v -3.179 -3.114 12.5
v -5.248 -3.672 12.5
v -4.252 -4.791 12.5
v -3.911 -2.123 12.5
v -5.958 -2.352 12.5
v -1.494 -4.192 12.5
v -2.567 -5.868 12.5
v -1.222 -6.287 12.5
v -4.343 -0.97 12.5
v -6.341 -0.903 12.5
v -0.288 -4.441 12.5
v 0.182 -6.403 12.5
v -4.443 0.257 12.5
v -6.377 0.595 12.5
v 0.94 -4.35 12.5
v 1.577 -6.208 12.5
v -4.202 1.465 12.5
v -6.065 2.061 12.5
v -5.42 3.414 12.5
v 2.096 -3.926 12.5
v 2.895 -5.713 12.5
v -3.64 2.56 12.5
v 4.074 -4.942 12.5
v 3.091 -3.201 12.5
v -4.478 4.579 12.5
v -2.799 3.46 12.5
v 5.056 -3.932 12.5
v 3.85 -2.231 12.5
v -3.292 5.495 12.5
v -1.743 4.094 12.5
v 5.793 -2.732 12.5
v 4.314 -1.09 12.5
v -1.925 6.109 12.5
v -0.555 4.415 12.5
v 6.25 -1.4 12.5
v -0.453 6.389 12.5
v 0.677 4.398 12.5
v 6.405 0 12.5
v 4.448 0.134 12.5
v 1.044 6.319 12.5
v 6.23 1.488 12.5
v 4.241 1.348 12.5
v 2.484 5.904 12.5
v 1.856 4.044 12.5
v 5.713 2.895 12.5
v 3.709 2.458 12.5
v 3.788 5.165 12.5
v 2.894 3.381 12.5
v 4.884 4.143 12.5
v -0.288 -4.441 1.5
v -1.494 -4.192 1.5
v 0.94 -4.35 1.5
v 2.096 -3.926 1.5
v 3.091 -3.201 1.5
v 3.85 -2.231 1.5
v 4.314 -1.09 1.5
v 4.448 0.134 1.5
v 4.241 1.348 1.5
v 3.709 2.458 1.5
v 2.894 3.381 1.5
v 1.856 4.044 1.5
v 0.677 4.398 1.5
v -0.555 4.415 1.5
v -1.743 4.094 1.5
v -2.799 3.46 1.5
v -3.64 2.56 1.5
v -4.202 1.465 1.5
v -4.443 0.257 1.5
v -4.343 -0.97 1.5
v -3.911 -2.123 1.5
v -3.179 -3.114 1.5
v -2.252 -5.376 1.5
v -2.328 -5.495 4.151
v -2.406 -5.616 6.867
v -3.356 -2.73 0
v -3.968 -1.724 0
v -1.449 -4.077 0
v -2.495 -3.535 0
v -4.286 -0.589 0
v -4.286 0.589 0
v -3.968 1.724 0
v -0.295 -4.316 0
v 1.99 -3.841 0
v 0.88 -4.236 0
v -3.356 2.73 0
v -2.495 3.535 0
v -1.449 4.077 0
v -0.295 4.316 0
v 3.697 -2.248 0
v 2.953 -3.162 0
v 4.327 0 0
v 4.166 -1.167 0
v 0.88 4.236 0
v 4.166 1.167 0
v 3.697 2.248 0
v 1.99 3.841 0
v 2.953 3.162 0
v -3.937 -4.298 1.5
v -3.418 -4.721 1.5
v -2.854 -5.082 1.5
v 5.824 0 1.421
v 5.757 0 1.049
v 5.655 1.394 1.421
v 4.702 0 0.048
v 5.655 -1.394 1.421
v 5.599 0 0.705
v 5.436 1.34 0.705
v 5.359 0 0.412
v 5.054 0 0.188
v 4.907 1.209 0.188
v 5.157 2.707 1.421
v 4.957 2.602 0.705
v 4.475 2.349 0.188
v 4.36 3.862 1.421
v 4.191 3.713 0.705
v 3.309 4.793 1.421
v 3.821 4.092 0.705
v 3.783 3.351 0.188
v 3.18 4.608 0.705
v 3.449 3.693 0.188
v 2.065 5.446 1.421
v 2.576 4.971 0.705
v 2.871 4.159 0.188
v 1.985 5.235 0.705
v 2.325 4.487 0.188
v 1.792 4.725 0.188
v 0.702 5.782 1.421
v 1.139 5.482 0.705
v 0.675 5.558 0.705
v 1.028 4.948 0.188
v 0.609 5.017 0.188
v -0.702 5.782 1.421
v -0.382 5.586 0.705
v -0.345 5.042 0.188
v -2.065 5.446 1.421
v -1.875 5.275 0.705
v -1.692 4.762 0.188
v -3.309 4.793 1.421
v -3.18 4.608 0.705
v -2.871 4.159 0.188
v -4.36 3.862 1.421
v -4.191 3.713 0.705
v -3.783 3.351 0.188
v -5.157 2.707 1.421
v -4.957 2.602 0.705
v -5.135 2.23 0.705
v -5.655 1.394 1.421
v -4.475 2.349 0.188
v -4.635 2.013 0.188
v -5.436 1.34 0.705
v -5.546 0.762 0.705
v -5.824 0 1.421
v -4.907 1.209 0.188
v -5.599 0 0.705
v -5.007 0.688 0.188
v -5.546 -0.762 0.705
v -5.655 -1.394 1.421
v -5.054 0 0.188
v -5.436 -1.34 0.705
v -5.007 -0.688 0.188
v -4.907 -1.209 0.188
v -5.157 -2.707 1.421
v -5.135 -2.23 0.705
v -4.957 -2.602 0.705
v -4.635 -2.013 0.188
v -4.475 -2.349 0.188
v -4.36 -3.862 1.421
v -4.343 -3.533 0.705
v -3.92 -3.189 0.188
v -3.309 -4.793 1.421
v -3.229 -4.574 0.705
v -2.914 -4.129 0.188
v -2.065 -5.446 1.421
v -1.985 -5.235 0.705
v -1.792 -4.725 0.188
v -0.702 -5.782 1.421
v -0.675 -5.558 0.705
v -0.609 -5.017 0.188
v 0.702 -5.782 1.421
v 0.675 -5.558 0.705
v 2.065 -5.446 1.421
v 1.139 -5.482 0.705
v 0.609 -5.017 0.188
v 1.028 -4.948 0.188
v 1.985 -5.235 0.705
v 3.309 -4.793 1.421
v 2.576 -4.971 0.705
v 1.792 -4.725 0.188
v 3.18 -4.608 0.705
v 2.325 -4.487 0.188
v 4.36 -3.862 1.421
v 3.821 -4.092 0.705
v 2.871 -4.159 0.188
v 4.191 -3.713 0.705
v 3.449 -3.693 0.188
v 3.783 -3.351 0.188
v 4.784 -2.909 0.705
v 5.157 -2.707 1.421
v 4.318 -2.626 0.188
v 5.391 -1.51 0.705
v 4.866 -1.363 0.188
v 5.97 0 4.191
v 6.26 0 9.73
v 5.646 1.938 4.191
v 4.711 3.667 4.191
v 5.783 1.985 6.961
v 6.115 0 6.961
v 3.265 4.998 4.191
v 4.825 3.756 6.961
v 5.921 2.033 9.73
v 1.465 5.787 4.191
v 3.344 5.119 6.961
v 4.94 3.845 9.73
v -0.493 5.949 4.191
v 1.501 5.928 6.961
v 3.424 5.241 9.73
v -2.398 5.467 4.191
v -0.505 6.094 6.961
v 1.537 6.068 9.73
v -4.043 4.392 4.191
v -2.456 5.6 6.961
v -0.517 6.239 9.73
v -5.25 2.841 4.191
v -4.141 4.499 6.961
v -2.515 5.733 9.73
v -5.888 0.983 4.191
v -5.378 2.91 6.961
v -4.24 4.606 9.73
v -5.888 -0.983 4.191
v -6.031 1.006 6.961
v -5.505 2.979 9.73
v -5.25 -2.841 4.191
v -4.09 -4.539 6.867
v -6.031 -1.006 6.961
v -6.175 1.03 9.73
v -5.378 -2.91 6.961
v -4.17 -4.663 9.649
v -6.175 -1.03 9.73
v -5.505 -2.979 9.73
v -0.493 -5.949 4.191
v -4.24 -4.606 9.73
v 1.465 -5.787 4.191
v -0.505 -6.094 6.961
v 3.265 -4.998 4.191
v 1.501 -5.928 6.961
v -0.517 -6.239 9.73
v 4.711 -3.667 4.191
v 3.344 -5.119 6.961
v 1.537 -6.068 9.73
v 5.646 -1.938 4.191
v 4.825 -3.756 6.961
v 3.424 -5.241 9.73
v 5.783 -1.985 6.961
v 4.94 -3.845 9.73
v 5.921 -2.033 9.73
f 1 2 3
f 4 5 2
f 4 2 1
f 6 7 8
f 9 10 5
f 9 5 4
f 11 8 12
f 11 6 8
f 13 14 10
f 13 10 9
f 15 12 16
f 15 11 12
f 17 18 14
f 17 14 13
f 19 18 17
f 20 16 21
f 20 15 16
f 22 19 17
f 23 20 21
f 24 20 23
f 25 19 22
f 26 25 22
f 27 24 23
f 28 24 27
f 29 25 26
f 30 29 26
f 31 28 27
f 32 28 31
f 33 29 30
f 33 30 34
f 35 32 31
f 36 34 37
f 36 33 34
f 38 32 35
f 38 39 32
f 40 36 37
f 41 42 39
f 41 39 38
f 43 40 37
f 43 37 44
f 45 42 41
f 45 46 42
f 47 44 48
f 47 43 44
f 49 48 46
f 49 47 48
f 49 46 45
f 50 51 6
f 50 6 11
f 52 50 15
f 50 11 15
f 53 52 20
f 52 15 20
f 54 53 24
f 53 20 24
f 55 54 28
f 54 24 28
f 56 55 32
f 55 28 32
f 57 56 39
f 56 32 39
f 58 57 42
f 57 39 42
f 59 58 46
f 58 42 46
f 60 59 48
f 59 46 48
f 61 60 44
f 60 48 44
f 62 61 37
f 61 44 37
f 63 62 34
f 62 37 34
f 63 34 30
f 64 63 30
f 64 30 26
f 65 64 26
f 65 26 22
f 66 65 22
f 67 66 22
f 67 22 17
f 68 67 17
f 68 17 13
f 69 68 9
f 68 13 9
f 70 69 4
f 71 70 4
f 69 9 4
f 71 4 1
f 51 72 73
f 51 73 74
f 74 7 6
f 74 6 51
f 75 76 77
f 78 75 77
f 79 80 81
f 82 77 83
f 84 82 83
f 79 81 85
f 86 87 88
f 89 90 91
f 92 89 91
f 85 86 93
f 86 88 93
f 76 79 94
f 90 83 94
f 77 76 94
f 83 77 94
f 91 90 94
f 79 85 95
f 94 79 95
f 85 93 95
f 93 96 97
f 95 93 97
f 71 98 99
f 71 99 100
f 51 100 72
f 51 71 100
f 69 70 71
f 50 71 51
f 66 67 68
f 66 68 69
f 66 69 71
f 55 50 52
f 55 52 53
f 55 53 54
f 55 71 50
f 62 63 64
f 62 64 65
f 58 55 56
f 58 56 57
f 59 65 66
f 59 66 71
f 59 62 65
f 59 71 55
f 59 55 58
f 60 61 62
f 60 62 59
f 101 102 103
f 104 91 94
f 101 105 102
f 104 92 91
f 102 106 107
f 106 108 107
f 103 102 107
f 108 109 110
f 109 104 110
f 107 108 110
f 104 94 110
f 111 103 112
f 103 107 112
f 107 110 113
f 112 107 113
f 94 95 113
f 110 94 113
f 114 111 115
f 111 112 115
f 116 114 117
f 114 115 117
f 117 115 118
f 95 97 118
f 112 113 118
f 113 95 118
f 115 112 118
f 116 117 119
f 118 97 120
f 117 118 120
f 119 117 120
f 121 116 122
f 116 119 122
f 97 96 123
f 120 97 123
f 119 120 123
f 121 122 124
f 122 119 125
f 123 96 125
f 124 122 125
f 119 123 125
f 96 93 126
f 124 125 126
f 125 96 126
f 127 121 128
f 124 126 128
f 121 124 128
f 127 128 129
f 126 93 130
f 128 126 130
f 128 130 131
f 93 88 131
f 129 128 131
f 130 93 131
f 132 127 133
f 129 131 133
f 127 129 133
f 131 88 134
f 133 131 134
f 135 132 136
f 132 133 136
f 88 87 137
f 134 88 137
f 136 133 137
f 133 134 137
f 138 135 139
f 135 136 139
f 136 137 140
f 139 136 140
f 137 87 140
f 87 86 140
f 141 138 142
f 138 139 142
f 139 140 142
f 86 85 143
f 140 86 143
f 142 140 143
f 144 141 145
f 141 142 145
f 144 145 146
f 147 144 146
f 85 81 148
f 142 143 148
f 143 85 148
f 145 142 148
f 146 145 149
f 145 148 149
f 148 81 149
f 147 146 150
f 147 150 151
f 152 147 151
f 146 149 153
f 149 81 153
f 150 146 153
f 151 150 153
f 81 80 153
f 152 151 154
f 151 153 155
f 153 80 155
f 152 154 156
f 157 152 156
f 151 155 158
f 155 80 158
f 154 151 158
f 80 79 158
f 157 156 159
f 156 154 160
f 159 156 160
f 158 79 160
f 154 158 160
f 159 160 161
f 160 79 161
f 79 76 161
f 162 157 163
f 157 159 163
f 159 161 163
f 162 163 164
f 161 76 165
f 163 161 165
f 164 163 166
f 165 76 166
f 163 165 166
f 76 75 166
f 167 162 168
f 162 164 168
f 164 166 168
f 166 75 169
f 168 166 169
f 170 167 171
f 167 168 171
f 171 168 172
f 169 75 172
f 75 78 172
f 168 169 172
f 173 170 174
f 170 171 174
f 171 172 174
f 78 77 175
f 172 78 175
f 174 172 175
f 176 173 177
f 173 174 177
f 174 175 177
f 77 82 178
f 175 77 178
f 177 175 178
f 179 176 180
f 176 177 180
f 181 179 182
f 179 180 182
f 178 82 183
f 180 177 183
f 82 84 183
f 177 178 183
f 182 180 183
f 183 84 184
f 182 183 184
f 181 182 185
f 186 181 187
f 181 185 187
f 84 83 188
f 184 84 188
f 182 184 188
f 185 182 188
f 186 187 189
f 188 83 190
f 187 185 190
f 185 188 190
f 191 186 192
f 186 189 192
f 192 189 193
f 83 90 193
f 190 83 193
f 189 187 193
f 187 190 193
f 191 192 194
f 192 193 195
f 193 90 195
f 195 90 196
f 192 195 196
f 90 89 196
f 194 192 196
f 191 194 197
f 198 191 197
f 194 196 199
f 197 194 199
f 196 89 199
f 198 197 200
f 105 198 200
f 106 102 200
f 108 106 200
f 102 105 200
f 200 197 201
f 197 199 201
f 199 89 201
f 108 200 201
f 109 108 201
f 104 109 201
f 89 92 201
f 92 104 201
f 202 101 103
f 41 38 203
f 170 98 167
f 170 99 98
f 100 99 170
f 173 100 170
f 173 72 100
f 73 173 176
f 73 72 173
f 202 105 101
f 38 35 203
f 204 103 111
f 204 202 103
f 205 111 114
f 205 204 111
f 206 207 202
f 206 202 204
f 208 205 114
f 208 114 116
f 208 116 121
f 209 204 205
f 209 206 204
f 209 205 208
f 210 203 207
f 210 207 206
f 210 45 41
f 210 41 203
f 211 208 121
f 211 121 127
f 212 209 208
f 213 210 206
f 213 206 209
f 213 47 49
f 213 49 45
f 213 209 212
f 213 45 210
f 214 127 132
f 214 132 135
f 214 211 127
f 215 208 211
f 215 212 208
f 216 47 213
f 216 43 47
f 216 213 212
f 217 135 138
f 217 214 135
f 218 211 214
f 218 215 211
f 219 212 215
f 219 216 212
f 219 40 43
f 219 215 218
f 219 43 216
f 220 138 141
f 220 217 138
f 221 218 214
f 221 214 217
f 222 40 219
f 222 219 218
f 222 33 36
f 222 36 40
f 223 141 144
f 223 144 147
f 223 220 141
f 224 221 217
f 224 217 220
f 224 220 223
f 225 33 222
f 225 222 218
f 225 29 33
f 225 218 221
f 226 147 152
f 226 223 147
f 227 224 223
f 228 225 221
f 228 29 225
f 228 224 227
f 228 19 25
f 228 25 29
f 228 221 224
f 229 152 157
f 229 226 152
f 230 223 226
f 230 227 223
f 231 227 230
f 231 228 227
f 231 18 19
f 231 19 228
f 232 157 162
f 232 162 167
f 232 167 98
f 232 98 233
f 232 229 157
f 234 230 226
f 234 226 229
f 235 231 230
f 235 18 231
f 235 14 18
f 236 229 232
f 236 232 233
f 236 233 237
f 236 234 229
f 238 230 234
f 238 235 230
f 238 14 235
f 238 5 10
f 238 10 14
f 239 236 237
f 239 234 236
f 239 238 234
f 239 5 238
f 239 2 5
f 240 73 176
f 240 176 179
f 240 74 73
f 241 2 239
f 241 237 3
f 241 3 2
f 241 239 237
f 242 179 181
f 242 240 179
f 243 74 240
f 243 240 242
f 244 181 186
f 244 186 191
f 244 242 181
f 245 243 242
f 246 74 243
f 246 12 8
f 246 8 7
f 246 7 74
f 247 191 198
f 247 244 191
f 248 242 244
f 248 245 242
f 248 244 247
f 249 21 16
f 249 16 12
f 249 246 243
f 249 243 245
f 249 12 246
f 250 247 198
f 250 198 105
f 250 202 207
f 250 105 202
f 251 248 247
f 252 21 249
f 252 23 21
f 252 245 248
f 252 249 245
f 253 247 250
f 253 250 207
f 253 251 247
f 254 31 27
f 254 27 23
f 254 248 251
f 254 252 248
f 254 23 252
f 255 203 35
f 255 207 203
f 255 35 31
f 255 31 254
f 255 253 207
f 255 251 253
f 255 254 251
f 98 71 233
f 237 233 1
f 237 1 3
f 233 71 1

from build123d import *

# Parameters (mm, degrees)
F0_R     = 5.75
F1_DEPTH = 12.5
F1_TAPER = -3
F3_DEPTH = 11
F4_R     = 1.5


with BuildPart() as f1:
    # F0 (on Top) → F1 (new body)
    with BuildSketch(Plane.XY):
        Circle(F0_R)
    extrude(amount=F1_DEPTH, taper=F1_TAPER)

    # F2 (on face) → F3 (cut)
    with BuildSketch(Plane.XY.offset(12.5)):
        with BuildLine():
            Line((-4.8323294905, -9.4099955732), (-1.494225813, -4.1916332401))
            ThreePointArc((-1.494225813, -4.1916332401), (2.3979489295, 3.7486452128), (-3.1790101783, -3.1139033842))
            Line((-3.1790101783, -3.1139033842), (-6.5171138558, -8.3322657173))
            Line((-6.5171138558, -8.3322657173), (-4.8323294905, -9.4099955732))
        make_face()
    extrude(amount=-F3_DEPTH, mode=Mode.SUBTRACT)

    # F4
    f4_edges = [f1.edges().sort_by_distance(p)[0] for p in [
        (-5.75, 0, 0),
    ]]
    fillet(f4_edges, radius=F4_R)


solid = f1.part
